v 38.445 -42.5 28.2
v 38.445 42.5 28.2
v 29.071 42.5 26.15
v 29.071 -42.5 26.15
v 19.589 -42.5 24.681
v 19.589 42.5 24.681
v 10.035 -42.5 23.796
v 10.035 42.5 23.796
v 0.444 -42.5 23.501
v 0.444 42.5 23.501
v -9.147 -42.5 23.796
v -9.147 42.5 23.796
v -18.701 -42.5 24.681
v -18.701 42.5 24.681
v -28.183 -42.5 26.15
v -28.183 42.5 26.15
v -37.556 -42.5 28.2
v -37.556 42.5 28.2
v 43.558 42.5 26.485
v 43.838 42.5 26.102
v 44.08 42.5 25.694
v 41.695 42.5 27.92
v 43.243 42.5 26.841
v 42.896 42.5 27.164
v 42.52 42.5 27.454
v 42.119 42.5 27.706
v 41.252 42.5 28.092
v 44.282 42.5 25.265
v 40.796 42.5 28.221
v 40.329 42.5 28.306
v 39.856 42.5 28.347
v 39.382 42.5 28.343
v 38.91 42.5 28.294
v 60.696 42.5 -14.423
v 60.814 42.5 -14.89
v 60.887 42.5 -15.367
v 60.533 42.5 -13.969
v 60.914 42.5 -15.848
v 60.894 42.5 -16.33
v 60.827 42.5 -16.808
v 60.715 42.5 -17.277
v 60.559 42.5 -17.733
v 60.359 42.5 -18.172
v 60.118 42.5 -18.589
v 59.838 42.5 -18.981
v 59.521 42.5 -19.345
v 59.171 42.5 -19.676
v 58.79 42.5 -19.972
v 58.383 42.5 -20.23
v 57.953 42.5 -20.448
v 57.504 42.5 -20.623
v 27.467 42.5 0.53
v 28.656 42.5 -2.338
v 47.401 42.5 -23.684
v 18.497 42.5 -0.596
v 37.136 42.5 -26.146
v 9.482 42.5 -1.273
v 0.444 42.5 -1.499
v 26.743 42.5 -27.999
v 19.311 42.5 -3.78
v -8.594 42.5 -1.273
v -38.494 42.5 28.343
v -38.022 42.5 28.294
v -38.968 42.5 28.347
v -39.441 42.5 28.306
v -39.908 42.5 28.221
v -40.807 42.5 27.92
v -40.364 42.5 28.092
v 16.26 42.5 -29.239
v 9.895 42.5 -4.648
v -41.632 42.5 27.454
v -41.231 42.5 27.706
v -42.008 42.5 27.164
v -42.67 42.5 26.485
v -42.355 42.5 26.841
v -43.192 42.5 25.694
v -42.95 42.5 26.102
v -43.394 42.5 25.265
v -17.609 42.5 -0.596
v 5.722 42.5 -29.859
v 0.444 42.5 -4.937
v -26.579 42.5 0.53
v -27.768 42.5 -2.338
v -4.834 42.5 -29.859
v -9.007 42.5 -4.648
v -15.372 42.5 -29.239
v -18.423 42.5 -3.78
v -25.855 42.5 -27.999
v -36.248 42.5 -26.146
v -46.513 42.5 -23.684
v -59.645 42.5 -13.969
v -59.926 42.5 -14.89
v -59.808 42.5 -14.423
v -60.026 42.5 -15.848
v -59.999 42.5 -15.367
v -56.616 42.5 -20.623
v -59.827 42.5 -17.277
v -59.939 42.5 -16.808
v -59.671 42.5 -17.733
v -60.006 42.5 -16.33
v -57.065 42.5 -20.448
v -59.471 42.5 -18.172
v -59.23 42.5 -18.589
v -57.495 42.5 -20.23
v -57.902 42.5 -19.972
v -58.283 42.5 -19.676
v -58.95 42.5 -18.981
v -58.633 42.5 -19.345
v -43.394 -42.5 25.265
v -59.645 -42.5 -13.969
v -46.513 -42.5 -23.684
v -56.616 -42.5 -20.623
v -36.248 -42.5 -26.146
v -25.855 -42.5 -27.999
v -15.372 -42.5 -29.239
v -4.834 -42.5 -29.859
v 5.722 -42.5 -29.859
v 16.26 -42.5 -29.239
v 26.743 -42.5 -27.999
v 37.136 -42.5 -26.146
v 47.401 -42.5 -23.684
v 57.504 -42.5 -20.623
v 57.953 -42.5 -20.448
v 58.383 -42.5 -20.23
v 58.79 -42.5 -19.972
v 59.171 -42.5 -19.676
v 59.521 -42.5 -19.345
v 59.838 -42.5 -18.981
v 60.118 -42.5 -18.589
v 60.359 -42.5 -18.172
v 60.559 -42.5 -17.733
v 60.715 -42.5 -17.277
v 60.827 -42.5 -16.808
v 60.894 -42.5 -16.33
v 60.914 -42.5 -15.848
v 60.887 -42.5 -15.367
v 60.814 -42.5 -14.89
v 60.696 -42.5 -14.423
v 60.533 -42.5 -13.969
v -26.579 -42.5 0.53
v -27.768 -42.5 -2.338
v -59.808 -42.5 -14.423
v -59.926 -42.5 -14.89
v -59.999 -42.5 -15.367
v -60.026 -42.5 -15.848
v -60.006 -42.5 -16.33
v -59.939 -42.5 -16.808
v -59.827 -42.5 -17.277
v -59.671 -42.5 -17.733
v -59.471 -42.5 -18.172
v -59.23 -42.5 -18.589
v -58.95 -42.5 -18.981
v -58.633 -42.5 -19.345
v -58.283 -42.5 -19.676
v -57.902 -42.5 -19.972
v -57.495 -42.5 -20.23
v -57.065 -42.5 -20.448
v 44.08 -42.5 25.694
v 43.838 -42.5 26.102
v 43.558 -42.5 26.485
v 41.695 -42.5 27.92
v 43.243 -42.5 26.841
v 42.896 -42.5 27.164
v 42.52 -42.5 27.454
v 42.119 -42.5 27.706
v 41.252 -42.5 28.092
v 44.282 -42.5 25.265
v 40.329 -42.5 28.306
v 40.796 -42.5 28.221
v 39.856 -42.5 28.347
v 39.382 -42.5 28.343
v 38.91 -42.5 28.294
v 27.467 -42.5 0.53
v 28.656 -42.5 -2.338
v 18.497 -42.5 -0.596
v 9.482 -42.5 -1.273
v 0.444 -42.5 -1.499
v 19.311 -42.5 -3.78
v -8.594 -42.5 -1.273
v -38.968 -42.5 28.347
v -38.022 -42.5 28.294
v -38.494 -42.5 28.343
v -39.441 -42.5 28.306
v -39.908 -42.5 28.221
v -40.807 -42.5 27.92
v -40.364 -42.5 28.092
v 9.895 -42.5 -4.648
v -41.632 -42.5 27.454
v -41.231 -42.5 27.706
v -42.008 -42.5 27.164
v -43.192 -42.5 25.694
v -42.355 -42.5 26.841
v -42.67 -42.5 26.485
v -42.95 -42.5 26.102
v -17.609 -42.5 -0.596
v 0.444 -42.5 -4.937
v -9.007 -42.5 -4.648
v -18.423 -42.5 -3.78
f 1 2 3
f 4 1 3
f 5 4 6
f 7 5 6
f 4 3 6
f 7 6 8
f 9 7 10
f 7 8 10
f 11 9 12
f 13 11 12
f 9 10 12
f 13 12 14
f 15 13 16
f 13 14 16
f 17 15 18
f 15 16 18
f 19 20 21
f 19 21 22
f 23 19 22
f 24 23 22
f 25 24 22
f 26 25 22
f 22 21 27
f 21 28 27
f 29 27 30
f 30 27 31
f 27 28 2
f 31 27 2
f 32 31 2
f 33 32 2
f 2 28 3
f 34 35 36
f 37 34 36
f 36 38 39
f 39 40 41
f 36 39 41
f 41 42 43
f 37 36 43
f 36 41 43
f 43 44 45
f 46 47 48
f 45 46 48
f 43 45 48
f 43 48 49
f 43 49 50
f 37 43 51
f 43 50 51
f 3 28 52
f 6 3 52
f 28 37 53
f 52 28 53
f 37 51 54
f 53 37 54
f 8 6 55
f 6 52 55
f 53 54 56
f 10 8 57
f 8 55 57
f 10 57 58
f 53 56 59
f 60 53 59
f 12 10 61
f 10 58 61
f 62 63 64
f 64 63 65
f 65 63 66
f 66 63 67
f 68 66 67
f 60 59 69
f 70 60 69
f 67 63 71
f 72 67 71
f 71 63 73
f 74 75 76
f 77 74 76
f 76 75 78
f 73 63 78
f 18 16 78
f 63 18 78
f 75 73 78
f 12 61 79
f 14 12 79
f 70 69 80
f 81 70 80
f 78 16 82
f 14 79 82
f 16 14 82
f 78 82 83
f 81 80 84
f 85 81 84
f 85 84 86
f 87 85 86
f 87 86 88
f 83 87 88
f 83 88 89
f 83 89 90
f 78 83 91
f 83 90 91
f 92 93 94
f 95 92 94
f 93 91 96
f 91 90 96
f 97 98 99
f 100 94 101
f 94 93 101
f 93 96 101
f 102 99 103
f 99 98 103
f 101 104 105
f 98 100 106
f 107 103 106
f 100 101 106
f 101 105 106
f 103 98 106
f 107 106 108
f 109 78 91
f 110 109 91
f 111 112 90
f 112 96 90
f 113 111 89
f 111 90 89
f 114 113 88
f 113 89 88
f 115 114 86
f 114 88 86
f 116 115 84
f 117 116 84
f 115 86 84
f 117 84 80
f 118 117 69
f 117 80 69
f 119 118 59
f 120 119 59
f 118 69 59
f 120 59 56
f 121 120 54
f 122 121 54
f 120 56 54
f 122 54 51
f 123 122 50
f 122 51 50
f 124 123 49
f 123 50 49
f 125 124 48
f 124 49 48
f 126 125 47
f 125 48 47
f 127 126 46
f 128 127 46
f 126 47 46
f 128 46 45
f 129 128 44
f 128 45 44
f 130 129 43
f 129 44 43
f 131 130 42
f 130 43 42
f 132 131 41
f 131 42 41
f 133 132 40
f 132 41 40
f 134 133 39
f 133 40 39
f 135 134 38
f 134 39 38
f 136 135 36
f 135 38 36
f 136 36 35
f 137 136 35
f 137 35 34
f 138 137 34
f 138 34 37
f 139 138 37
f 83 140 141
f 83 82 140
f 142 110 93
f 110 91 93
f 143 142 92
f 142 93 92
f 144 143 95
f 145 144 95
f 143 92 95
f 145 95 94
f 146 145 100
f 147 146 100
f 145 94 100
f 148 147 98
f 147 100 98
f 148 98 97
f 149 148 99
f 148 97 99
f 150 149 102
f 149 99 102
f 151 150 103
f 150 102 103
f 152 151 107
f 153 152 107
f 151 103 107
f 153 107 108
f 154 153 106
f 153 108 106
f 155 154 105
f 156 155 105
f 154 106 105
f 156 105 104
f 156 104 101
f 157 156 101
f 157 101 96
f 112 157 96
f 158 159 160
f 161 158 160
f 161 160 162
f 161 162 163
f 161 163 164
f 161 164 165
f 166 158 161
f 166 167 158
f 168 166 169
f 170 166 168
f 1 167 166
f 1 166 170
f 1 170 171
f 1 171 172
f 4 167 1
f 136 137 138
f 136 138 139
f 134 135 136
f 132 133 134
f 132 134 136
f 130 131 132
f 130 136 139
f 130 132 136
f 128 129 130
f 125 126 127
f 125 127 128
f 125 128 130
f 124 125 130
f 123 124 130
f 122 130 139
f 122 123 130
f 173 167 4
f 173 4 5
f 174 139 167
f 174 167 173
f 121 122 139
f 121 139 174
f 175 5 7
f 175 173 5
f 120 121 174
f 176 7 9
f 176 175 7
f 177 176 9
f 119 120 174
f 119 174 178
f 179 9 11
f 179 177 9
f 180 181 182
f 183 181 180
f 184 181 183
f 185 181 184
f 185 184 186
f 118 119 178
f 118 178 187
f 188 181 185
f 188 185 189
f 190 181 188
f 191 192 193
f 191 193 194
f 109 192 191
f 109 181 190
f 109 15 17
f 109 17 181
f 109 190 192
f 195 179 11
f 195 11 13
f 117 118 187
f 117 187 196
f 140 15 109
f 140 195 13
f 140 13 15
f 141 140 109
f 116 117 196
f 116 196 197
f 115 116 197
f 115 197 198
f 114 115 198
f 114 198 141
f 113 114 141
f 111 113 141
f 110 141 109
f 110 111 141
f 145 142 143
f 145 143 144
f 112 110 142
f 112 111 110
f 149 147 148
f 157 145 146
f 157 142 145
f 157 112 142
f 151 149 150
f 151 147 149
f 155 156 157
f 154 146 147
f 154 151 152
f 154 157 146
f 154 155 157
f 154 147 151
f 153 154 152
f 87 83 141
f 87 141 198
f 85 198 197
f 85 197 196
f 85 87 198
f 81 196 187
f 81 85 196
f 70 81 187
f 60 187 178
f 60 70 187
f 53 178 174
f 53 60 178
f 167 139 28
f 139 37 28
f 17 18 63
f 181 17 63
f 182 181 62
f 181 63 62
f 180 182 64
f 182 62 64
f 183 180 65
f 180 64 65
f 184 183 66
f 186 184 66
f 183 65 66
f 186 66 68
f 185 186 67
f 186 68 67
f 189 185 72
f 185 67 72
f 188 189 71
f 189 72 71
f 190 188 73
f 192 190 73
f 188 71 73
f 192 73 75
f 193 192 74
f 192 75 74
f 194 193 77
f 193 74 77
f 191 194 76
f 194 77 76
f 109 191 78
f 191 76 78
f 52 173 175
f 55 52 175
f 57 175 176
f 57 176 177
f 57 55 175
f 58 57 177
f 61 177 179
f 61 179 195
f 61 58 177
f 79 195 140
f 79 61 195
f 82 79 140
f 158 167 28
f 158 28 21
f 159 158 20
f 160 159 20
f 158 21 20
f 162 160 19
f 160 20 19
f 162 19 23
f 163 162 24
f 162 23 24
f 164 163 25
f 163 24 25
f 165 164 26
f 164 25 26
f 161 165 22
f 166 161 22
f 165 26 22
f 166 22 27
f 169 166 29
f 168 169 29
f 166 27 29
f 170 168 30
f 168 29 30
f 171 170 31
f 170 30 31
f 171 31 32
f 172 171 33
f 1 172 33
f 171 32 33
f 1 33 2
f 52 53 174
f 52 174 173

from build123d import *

# Parameters (mm, degrees)
BOSS_EXTRUDE1_DEPTH = 42.5


with BuildPart() as part:
    # Sketch1 → Boss-Extrude1 (new, symmetric)
    with BuildSketch(Plane(origin=(0, 0, 0), x_dir=(1, 0, 0), z_dir=(0, 1, 0))):
        with BuildLine():
            Line((-43.393852632, -25.264521876), (-59.645031086, 13.969293553))
            ThreePointArc((-59.645031086, 13.969293553), (-59.576188638, 17.954532916), (-56.615582649, 20.623181309))
            ThreePointArc((-56.615582649, 20.623181309), (0.444031685, 29.937093688), (57.50364602, 20.623181309))
            ThreePointArc((57.50364602, 20.623181309), (60.464252009, 17.954532916), (60.533094457, 13.969293553))
            Line((60.533094457, 13.969293553), (44.281916002, -25.264521876))
            ThreePointArc((44.281916002, -25.264521876), (41.909163826, -27.81793626), (38.444552916, -28.200492328))
            ThreePointArc((38.444552916, -28.200492328), (0.444031685, -23.501385869), (-37.556489545, -28.200492328))
            ThreePointArc((-37.556489545, -28.200492328), (-41.021100455, -27.81793626), (-43.393852632, -25.264521876))
        make_face()
        with BuildLine():
            Line((-26.579395894, -0.530063133), (-27.767590131, 2.338491509))
            ThreePointArc((-27.767590131, 2.338491509), (0.444031685, 4.937093688), (28.655653502, 2.338491509))
            Line((28.655653502, 2.338491509), (27.467459265, -0.530063133))
            ThreePointArc((27.467459265, -0.530063133), (0.444031685, 1.498614131), (-26.579395894, -0.530063133))
        make_face(mode=Mode.SUBTRACT)
    extrude(amount=BOSS_EXTRUDE1_DEPTH, both=True)


solid = part.part
